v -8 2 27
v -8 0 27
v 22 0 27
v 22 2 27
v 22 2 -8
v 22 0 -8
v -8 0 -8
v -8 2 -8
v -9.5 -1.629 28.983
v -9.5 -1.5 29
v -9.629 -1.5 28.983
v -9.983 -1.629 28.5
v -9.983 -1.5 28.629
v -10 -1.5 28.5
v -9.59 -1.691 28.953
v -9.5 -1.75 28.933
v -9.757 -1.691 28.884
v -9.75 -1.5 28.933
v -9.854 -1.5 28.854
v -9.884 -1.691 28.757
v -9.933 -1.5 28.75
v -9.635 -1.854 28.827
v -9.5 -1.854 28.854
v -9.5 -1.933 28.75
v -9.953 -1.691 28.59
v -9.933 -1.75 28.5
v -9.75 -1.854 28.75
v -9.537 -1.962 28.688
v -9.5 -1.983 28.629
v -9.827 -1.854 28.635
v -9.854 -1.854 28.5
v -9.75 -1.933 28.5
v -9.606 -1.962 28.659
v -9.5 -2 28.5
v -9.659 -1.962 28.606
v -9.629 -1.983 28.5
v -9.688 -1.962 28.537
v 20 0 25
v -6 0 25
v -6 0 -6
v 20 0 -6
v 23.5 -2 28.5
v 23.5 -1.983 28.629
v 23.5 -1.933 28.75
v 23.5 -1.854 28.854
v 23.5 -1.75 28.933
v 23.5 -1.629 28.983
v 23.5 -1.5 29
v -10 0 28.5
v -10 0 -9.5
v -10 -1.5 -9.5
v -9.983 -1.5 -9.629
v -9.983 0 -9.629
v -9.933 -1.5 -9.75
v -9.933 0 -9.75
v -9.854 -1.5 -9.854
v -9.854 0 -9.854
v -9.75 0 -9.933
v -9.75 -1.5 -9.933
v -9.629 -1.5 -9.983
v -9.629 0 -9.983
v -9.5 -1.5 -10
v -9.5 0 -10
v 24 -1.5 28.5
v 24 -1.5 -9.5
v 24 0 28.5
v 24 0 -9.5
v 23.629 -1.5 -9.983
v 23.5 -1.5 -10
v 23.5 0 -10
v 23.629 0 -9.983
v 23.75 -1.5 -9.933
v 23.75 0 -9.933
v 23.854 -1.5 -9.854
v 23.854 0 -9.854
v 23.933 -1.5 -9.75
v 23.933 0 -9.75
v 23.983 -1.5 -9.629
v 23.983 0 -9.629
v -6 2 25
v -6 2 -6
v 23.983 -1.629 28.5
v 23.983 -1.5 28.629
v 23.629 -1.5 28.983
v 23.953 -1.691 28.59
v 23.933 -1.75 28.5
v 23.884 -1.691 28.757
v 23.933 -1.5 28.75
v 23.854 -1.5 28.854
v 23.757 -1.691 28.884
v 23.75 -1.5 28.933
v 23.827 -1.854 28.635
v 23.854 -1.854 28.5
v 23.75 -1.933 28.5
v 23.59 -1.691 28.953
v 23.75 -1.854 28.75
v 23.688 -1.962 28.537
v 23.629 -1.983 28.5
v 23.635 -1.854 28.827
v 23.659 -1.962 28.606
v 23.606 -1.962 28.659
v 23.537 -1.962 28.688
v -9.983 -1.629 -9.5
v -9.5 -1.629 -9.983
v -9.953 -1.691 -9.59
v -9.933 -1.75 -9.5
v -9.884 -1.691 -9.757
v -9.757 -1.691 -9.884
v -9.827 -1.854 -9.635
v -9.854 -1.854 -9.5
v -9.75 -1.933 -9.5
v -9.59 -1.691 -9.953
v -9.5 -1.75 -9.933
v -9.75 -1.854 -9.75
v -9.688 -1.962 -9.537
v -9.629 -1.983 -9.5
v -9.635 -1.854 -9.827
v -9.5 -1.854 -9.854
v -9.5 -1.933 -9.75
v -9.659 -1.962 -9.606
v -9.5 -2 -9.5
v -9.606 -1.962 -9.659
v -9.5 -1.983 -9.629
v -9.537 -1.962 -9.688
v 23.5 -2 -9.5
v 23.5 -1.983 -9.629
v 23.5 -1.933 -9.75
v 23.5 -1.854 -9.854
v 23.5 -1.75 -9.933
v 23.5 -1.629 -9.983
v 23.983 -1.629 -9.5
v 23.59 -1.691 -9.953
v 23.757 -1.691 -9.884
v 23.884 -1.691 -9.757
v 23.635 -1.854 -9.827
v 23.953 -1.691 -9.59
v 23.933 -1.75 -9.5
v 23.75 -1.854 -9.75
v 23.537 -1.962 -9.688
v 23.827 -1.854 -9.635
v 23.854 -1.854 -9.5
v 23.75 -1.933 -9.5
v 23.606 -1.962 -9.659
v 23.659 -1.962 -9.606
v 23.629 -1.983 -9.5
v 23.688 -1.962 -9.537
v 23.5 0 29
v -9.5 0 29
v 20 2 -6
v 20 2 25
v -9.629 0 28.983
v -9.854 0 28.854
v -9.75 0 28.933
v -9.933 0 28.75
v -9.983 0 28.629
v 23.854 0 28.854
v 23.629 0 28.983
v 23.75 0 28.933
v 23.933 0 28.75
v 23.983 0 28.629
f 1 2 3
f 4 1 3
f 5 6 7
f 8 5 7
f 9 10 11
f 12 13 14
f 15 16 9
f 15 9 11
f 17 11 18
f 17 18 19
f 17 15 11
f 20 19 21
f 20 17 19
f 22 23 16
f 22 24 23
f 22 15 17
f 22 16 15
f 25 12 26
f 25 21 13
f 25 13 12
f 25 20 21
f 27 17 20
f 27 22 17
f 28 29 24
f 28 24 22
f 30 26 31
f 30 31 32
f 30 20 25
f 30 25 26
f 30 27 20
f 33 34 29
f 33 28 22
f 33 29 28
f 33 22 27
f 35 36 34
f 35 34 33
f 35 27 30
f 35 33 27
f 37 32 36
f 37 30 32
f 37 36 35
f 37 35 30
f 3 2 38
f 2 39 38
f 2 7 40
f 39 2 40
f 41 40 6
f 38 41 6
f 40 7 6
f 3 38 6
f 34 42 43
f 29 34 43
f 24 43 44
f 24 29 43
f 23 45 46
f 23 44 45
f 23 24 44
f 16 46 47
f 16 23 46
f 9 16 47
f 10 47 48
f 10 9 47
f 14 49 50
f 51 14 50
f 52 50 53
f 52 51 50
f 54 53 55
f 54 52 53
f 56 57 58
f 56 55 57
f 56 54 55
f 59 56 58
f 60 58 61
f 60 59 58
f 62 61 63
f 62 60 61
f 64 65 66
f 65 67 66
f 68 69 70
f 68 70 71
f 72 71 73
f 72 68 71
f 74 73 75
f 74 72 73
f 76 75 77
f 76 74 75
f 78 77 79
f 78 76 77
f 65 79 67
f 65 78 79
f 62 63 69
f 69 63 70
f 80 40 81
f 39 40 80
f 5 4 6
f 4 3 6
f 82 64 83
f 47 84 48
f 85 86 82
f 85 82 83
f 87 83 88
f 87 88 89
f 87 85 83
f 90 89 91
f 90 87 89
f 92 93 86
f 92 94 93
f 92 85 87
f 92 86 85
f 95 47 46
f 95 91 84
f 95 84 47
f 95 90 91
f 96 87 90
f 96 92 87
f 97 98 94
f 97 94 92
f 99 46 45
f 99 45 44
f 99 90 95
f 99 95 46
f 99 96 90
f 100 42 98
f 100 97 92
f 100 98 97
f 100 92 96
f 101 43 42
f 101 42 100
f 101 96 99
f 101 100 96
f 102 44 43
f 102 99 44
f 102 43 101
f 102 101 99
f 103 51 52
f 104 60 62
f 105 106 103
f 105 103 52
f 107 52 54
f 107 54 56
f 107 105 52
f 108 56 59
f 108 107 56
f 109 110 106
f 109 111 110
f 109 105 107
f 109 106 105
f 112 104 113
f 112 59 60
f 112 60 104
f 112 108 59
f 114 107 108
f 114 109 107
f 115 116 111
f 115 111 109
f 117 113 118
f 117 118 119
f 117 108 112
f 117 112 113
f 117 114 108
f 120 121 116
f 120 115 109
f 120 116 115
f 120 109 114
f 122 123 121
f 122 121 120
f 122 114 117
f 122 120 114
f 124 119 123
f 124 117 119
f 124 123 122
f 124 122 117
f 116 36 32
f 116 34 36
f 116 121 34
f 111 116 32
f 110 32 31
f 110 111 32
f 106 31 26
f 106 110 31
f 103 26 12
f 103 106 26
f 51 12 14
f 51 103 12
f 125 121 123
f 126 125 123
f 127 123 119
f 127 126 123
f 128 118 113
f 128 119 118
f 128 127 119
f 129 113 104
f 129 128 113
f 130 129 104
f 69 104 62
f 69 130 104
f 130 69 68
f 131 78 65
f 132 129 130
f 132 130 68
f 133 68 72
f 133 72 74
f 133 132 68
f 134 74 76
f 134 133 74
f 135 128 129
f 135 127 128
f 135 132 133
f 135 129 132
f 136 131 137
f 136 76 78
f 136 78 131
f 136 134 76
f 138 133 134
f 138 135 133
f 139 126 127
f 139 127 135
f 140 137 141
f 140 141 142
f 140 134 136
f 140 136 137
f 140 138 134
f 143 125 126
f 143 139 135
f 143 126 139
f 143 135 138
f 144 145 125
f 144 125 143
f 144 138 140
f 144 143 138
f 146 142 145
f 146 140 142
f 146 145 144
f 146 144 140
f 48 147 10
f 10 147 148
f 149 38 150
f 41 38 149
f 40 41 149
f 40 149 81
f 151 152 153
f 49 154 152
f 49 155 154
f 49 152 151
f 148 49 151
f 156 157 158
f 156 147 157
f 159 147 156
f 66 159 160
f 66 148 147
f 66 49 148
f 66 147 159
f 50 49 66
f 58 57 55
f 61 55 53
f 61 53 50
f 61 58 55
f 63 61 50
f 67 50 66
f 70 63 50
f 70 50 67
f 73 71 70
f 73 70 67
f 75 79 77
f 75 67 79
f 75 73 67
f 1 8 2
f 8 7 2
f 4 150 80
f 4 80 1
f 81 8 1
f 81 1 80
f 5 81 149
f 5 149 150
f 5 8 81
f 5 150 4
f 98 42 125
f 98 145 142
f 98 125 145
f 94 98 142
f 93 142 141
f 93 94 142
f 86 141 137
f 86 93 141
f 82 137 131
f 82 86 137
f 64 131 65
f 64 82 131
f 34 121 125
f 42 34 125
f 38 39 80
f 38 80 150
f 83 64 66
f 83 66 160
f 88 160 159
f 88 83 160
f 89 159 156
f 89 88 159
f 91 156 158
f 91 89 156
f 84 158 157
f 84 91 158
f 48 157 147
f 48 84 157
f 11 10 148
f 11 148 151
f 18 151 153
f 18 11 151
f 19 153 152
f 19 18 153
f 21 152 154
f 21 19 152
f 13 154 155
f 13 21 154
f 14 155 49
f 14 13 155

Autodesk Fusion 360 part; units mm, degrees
sketch "Esquisse1" plane through (0, 0, 0) normal (0, 1, 0) x (1, 0, 0)
  line L0 (-10, 10) -> (24, 10)
  line L1 (24, 10) -> (24, -29)
  line L2 (24, -29) -> (-10, -29)
  line L3 (-10, -29) -> (-10, 10)
  line L4 (-8, -27) -> (22, -27)
  line L5 (22, -27) -> (22, 8)
  line L6 (22, 8) -> (-8, 8)
  line L7 (-8, 8) -> (-8, -27)
  line L8 (-6, -25) -> (20, -25)
  line L9 (20, -25) -> (20, 6)
  line L10 (20, 6) -> (-6, 6)
  line L11 (-6, 6) -> (-6, -25)
extrude "Extrusion1" add sketch "Esquisse1" against normal blind 2 contours L0 L1 L2 L3 | L4 L5 L6 L7 | L8 L9 L10 L11 makes body 1
extrude "Extrusion2" add sketch "Esquisse1" along normal blind 2 separate body contours L4 L5 L6 L7 makes body 2
fillet "Congé1" radius 0.5 1 edges at (-10, -1, -10) on bodies 1
fillet "Congé2" radius 0.5 1 edges at (24, -1, -10) on bodies 1
fillet "Congé3" radius 0.5 1 edges at (24, -1, 29) on bodies 1
fillet "Congé4" radius 0.5 1 edges at (-10, -1, 29) on bodies 1
fillet "Congé5" radius 0.5 8 edges at (-9.8536, -2, 28.8536) (-10, -2, 9.5) (-9.8536, -2, -9.8536) (7, -2, -10) (23.8536, -2, -9.8536) (24, -2, 9.5) (23.8536, -2, 28.8536) (7, -2, 29) on bodies 1
